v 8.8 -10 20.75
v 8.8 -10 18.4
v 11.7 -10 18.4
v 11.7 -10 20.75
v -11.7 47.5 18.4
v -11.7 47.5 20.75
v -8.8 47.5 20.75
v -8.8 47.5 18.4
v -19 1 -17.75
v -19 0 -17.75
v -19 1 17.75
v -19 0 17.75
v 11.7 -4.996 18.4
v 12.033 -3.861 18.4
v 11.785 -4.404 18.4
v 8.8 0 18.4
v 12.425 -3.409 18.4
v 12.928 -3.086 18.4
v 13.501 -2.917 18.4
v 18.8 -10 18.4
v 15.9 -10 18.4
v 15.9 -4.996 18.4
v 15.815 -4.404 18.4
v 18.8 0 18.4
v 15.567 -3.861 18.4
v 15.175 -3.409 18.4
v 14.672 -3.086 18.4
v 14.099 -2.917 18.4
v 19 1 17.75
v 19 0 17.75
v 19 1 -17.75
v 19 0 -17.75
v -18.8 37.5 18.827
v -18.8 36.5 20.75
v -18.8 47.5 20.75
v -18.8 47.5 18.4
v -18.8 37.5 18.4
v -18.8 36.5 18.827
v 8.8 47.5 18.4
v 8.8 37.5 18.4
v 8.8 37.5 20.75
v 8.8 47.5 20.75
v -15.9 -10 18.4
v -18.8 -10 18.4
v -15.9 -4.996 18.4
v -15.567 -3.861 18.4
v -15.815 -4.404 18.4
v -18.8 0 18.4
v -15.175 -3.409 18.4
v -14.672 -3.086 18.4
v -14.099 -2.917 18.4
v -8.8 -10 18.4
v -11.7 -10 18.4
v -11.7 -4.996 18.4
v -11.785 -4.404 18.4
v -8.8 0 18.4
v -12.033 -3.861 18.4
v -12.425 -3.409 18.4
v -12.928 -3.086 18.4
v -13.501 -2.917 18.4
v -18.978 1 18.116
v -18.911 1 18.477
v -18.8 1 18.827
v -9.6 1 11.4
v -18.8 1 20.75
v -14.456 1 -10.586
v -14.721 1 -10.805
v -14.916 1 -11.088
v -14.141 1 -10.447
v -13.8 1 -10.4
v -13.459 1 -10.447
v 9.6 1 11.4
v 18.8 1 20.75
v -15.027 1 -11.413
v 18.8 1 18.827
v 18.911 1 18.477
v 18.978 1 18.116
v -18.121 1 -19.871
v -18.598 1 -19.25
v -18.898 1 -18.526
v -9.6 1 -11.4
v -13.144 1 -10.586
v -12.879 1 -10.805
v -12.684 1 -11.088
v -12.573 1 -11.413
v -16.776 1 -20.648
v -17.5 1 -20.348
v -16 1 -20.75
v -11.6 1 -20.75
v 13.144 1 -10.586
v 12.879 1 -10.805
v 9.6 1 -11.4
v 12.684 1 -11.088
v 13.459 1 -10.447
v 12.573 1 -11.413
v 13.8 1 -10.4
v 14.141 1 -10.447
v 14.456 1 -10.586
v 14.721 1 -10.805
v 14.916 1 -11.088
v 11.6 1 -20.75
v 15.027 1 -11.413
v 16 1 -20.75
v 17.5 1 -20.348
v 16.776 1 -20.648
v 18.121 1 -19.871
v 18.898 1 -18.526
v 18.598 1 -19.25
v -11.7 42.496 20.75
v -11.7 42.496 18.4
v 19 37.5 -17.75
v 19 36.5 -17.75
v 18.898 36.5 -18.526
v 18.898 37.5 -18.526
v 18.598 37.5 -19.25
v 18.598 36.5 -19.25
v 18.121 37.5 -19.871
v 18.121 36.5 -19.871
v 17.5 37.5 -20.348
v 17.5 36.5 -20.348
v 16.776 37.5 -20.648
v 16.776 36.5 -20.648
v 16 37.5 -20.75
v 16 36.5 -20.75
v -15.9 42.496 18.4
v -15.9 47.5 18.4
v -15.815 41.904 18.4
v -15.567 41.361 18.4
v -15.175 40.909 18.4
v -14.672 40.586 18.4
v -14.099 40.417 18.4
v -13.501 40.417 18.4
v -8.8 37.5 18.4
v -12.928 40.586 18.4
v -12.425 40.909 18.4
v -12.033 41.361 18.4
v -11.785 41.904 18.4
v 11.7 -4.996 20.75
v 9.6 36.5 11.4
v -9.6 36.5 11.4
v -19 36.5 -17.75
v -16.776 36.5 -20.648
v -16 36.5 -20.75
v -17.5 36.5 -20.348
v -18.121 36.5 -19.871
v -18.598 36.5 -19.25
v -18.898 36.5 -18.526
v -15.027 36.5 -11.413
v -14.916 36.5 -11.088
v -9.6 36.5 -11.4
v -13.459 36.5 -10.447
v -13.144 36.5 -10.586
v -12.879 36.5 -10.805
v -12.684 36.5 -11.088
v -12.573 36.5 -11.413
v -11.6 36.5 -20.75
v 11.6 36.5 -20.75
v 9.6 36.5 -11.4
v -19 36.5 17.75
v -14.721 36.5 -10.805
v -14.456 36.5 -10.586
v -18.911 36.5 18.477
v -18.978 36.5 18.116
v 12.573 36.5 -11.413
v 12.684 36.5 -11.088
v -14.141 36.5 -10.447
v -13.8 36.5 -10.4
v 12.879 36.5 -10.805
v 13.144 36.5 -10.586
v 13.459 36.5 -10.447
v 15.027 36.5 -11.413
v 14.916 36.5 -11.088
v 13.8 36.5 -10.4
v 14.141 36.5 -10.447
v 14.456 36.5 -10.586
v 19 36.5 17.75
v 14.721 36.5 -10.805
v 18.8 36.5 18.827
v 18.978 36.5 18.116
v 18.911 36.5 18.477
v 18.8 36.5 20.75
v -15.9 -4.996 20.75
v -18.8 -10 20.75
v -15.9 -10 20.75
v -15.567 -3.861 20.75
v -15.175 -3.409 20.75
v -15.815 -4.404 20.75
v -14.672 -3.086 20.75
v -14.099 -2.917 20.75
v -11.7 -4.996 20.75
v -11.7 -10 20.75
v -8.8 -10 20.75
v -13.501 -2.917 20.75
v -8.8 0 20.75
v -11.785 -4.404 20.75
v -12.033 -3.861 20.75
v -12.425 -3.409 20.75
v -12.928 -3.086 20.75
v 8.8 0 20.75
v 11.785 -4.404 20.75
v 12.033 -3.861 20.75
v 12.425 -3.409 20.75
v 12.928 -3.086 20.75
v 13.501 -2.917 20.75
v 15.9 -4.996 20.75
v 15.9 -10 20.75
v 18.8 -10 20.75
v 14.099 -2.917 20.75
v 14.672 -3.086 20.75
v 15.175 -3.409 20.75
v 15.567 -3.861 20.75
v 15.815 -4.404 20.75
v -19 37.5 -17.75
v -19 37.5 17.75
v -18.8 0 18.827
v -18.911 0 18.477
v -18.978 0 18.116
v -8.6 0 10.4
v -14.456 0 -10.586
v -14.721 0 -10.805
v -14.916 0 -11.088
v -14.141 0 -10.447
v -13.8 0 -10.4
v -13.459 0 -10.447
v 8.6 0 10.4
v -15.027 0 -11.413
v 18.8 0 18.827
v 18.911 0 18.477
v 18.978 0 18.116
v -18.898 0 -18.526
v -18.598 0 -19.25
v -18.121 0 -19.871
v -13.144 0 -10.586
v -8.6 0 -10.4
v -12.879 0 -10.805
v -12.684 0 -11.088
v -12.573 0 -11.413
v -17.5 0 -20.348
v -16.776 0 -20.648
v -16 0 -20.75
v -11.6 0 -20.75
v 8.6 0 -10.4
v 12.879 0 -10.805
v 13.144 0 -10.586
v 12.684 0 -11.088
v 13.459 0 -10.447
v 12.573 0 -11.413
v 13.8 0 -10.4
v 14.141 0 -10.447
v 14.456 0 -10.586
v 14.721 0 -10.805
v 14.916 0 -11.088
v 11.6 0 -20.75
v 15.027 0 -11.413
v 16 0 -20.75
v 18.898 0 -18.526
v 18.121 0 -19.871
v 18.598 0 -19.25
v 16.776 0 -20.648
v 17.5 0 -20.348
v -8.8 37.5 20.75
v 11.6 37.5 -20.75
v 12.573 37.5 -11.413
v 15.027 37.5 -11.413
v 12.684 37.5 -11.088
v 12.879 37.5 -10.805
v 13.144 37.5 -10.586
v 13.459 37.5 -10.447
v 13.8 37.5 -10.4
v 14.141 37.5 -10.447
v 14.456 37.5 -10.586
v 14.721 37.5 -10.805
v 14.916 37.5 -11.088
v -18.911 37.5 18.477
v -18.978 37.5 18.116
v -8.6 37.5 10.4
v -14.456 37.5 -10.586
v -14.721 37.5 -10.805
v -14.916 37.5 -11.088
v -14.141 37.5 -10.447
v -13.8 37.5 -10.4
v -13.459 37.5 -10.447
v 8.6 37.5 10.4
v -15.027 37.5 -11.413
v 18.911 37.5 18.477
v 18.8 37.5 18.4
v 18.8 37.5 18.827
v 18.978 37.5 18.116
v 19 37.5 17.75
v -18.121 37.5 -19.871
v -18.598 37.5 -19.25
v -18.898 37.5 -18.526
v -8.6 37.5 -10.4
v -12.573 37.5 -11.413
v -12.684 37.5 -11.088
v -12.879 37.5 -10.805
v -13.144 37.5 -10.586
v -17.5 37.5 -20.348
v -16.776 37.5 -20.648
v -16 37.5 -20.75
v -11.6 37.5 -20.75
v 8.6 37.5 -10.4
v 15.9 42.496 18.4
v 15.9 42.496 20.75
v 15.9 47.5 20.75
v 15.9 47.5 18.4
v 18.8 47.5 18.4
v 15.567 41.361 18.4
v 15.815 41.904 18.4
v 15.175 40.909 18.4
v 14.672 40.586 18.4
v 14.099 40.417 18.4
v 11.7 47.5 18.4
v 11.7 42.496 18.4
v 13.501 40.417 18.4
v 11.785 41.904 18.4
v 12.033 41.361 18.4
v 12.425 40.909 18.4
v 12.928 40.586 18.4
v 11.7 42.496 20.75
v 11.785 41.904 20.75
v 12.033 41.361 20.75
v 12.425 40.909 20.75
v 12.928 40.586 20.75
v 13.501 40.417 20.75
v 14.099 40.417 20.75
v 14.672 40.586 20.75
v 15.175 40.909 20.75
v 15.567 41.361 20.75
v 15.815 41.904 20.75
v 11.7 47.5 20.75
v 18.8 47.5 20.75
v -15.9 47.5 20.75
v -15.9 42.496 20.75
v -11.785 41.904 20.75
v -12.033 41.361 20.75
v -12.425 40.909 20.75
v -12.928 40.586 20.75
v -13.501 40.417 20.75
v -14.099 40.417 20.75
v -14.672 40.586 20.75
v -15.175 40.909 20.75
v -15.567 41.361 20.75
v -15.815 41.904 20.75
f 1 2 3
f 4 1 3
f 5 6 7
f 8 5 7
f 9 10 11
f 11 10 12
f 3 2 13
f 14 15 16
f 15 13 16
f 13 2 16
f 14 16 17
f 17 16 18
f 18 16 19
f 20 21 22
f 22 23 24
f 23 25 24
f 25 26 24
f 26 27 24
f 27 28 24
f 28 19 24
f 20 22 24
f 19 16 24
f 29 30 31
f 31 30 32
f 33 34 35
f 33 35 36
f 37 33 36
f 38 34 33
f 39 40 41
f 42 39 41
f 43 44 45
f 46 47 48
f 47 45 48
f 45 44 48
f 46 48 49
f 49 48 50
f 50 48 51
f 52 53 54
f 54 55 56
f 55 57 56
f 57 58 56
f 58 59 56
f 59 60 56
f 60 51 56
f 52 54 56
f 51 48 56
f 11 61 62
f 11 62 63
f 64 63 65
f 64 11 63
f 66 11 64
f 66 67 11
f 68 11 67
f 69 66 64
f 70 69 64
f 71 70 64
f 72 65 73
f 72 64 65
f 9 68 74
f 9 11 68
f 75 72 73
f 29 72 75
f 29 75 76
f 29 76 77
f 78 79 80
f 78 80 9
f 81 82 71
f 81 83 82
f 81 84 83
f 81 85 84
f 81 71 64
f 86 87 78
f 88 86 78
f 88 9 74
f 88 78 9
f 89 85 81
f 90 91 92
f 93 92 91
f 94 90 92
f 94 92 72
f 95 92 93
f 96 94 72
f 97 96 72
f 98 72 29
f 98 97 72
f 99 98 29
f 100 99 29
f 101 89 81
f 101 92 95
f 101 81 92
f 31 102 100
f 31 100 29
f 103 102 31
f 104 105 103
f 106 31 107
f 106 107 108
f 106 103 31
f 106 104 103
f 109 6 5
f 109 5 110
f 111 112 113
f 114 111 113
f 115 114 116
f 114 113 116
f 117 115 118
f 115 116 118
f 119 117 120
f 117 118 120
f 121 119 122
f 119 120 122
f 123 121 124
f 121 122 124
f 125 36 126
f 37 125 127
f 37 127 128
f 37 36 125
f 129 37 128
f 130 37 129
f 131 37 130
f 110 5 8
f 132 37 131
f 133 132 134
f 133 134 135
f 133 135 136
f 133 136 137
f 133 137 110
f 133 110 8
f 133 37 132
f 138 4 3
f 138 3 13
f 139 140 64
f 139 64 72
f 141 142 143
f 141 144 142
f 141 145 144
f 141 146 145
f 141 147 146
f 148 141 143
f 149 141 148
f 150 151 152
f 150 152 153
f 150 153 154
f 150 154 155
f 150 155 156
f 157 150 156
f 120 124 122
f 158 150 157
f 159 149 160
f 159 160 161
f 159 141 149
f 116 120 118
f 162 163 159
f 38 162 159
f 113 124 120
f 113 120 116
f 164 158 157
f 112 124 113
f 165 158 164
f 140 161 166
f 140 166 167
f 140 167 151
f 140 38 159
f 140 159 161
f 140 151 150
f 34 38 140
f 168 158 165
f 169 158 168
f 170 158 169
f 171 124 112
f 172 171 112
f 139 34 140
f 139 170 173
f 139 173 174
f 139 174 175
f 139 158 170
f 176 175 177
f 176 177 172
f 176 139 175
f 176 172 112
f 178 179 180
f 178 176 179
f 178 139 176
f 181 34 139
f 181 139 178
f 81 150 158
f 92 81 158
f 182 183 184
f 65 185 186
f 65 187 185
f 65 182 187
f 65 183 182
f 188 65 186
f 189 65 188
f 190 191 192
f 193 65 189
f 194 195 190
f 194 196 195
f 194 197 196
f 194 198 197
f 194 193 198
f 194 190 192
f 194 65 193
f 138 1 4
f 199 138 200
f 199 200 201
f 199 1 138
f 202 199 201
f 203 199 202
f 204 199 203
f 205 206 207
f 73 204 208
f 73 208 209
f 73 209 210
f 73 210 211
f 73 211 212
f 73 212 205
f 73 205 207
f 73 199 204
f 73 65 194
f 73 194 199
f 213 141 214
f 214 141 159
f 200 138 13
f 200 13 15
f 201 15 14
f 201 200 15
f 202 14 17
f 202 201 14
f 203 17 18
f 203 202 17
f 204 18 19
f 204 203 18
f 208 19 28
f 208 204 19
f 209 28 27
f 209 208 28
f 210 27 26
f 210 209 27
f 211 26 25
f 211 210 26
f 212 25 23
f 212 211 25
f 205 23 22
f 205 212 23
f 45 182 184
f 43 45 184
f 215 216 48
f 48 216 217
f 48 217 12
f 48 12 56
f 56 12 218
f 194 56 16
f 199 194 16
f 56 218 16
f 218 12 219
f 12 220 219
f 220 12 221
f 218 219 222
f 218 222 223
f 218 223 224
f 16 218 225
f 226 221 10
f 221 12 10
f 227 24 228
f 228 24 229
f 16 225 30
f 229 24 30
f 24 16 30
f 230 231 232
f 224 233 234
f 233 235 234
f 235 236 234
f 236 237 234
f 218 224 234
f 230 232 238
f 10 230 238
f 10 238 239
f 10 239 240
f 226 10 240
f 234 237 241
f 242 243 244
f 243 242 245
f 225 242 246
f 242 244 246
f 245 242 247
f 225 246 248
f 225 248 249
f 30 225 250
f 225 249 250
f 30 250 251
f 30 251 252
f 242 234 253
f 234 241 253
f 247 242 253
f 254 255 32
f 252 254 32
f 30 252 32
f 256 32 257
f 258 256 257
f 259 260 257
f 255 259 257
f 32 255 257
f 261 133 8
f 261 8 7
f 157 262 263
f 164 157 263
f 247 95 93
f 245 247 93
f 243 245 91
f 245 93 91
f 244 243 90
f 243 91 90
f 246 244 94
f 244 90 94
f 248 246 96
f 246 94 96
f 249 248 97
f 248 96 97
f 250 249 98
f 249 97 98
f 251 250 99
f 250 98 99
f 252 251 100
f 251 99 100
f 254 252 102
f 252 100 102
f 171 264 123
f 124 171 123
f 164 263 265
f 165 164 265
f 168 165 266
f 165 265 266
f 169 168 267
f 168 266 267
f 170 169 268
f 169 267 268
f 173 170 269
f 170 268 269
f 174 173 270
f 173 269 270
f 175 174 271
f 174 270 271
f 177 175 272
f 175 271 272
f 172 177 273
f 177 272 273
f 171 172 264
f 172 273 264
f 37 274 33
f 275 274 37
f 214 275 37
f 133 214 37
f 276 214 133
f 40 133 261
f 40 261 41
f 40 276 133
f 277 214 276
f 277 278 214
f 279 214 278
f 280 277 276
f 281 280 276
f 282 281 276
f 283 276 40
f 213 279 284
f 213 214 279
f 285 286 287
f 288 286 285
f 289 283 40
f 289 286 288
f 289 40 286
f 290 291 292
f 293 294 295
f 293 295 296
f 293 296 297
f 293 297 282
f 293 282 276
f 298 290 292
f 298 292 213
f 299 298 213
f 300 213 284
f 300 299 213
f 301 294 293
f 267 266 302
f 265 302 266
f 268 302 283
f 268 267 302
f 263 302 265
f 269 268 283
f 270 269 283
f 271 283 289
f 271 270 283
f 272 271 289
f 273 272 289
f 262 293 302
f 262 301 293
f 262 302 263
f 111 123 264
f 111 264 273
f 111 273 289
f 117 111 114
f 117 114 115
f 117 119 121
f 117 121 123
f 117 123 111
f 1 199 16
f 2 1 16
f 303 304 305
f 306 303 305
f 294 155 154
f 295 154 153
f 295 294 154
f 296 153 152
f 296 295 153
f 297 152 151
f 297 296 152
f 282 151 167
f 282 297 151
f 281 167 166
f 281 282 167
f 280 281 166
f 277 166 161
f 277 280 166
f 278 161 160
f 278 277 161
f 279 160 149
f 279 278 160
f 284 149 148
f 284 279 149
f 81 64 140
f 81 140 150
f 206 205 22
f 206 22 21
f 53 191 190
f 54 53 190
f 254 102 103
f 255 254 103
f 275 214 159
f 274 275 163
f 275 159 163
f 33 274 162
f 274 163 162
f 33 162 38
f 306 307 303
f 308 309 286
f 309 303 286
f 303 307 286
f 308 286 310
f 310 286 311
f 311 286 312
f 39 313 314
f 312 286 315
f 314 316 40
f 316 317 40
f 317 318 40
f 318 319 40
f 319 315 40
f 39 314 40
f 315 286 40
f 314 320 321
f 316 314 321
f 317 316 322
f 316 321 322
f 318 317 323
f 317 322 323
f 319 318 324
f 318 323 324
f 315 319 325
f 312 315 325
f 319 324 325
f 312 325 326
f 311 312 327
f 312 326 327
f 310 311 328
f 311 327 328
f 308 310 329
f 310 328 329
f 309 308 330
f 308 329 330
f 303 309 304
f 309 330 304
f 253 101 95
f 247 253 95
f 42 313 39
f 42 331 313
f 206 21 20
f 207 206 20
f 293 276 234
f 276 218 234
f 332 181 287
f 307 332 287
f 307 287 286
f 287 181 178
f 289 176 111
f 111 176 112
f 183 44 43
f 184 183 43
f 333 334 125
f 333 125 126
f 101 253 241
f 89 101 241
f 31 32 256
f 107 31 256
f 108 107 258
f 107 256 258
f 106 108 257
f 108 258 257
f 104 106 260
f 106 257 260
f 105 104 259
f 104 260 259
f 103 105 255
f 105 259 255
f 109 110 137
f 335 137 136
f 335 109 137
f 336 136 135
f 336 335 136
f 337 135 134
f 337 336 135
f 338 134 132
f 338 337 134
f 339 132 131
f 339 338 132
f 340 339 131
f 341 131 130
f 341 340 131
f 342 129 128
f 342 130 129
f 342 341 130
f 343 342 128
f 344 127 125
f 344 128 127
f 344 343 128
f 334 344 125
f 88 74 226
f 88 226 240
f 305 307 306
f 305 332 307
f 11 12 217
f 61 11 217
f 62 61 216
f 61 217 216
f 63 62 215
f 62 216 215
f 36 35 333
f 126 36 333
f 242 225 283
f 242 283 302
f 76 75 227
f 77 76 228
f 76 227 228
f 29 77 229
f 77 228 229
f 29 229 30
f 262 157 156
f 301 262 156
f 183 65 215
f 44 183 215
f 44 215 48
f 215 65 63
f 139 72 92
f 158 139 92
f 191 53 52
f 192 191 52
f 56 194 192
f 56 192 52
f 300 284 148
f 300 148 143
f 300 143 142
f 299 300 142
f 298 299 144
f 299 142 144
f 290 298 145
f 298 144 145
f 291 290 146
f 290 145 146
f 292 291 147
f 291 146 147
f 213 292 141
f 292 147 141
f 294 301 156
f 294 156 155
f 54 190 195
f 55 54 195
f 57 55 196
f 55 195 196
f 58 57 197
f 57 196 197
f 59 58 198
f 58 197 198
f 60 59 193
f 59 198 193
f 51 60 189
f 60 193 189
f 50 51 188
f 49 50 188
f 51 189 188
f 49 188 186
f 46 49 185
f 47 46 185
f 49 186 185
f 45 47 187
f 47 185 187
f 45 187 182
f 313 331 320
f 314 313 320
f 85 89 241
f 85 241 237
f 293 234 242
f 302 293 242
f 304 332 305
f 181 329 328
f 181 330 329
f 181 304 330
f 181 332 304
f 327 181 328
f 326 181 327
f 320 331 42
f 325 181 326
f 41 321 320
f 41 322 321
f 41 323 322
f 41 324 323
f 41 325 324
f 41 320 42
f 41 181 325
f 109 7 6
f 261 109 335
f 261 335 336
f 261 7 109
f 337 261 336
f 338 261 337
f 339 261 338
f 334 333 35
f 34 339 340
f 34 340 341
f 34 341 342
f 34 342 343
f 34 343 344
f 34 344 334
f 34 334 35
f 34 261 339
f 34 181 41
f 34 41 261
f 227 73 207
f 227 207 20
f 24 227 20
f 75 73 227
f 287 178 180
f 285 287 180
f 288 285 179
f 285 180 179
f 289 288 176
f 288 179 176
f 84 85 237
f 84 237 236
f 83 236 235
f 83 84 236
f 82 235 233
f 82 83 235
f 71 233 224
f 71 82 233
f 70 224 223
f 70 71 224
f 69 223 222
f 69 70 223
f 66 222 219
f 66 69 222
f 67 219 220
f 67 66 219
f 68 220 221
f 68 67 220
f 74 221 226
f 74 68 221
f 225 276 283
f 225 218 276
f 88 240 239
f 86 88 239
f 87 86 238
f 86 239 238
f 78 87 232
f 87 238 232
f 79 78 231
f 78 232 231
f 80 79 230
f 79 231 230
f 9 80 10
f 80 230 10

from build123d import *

# Parameters (mm, degrees)
SKETCH1_W           = 17.2
SKETCH1_H           = 20.8
BOSS_EXTRUDE1_DEPTH = 1
SKETCH2_W           = 19.2
SKETCH2_H           = 22.8
SKETCH2_W_2         = 17.2
SKETCH2_H_2         = 20.8
BOSS_EXTRUDE2_DEPTH = 35.5
SKETCH3_W           = 17.2
SKETCH3_H           = 20.8
BOSS_EXTRUDE3_DEPTH = 1
CUT_EXTRUDE1_DEPTH  = 38.5
BOSS_EXTRUDE4_DEPTH = 11
SKETCH8_W           = 10
SKETCH8_H           = 2.35
BOSS_EXTRUDE5_DEPTH = 11
CUT_EXTRUDE2_DEPTH  = 42.5


with BuildPart() as part:
    # Sketch1 → Boss-Extrude1 (new body)
    with BuildSketch(Plane(origin=(0, 0, 0), x_dir=(1, 0, 0), z_dir=(0, 1, 0))):
        with BuildLine():
            Line((-16, -20.75), (16, -20.75))
            ThreePointArc((16, -20.75), (18.121320344, -19.871320344), (19, -17.75))
            Line((19, -17.75), (19, 17.75))
            ThreePointArc((19, 17.75), (18.121320344, 19.871320344), (16, 20.75))
            Line((16, 20.75), (-16, 20.75))
            ThreePointArc((-16, 20.75), (-18.121320344, 19.871320344), (-19, 17.75))
            Line((-19, 17.75), (-19, -17.75))
            ThreePointArc((-19, -17.75), (-18.121320344, -19.871320344), (-16, -20.75))
        make_face()
        Rectangle(SKETCH1_W, SKETCH1_H, mode=Mode.SUBTRACT)
    extrude(amount=BOSS_EXTRUDE1_DEPTH)

    # Sketch2 → Boss-Extrude2 (add)
    with BuildSketch(Plane(origin=(0, 1, 0), x_dir=(1, 0, 0), z_dir=(0, 1, 0))):
        Rectangle(SKETCH2_W, SKETCH2_H)
        Rectangle(SKETCH2_W_2, SKETCH2_H_2, mode=Mode.SUBTRACT)
    extrude(amount=BOSS_EXTRUDE2_DEPTH)

    # Sketch3 → Boss-Extrude3 (add)
    with BuildSketch(Plane(origin=(0, 36.5, 0), x_dir=(1, 0, 0), z_dir=(0, 1, 0))):
        with BuildLine():
            Line((-16, -20.75), (16, -20.75))
            ThreePointArc((16, -20.75), (18.121320344, -19.871320344), (19, -17.75))
            Line((19, -17.75), (19, 17.75))
            ThreePointArc((19, 17.75), (18.121320344, 19.871320344), (16, 20.75))
            Line((16, 20.75), (-16, 20.75))
            ThreePointArc((-16, 20.75), (-18.121320344, 19.871320344), (-19, 17.75))
            Line((-19, 17.75), (-19, -17.75))
            ThreePointArc((-19, -17.75), (-18.121320344, -19.871320344), (-16, -20.75))
        make_face()
        Rectangle(SKETCH3_W, SKETCH3_H, mode=Mode.SUBTRACT)
    extrude(amount=BOSS_EXTRUDE3_DEPTH)

    # Sketch4 → Cut-Extrude1 (cut, through all)
    with BuildSketch(Plane(origin=(0, 37.5, 0), x_dir=(-1, 0, 0), z_dir=(0, 1, 0))):
        with BuildLine():
            Line((11.6, -20.75), (12.572602238, -11.413367935))
            ThreePointArc((12.572602238, -11.413367935), (13.8, -10.4), (15.027397762, -11.413367935))
            Line((15.027397762, -11.413367935), (16, -20.75))
            Line((16, -20.75), (11.6, -20.75))
        make_face()
        with BuildLine():
            Line((-11.6, -20.75), (-12.572602238, -11.413367935))
            ThreePointArc((-12.572602238, -11.413367935), (-13.8, -10.4), (-15.027397762, -11.413367935))
            Line((-15.027397762, -11.413367935), (-16, -20.75))
            Line((-16, -20.75), (-11.6, -20.75))
        make_face()
    extrude(amount=-CUT_EXTRUDE1_DEPTH, mode=Mode.SUBTRACT)

    # Sketch6 → Boss-Extrude4 (add)
    with BuildSketch(Plane.XZ.offset(-36.5)):
        Polygon((-13.8, 20.75), (-18.8, 20.75), (-18.8, 18.4), (-8.8, 18.4), (-8.8, 20.75), align=None)
        Polygon((8.8, 18.4), (8.8, 20.75), (13.8, 20.75), (18.8, 20.75), (18.8, 18.4), align=None)
    extrude(amount=-BOSS_EXTRUDE4_DEPTH)

    # Sketch8 → Boss-Extrude5 (add)
    with BuildSketch(Plane(origin=(0, 1, 0), x_dir=(1, 0, 0), z_dir=(0, 1, 0))):
        with Locations((-13.8, -19.575)):
            Rectangle(SKETCH8_W, SKETCH8_H)
        with Locations((13.8, -19.575)):
            Rectangle(SKETCH8_W, SKETCH8_H)
    extrude(amount=-BOSS_EXTRUDE5_DEPTH)

    # Sketch9 → Cut-Extrude2 (cut, through all)
    with BuildSketch(Plane.XY.offset(20.75)):
        with BuildLine():
            Line((-15.9, -4.996046188), (-15.9, -10))
            Line((-15.9, -10), (-11.7, -10))
            Line((-11.7, -10), (-11.7, -4.996046188))
            ThreePointArc((-11.7, -4.996046188), (-13.8, -2.896046188), (-15.9, -4.996046188))
        make_face()
        with BuildLine():
            Line((15.9, -10), (11.7, -10))
            Line((11.7, -10), (11.7, -4.996046188))
            ThreePointArc((11.7, -4.996046188), (13.8, -2.896046188), (15.9, -4.996046188))
            Line((15.9, -4.996046188), (15.9, -10))
        make_face()
        with BuildLine():
            Line((15.9, 47.5), (11.7, 47.5))
            Line((11.7, 47.5), (11.7, 42.496046188))
            ThreePointArc((11.7, 42.496046188), (13.8, 40.396046188), (15.9, 42.496046188))
            Line((15.9, 42.496046188), (15.9, 47.5))
        make_face()
        with BuildLine():
            Line((-15.9, 47.5), (-11.7, 47.5))
            Line((-11.7, 47.5), (-11.7, 42.496046188))
            ThreePointArc((-11.7, 42.496046188), (-13.8, 40.396046188), (-15.9, 42.496046188))
            Line((-15.9, 42.496046188), (-15.9, 47.5))
        make_face()
    extrude(amount=-CUT_EXTRUDE2_DEPTH, mode=Mode.SUBTRACT)


solid = part.part
